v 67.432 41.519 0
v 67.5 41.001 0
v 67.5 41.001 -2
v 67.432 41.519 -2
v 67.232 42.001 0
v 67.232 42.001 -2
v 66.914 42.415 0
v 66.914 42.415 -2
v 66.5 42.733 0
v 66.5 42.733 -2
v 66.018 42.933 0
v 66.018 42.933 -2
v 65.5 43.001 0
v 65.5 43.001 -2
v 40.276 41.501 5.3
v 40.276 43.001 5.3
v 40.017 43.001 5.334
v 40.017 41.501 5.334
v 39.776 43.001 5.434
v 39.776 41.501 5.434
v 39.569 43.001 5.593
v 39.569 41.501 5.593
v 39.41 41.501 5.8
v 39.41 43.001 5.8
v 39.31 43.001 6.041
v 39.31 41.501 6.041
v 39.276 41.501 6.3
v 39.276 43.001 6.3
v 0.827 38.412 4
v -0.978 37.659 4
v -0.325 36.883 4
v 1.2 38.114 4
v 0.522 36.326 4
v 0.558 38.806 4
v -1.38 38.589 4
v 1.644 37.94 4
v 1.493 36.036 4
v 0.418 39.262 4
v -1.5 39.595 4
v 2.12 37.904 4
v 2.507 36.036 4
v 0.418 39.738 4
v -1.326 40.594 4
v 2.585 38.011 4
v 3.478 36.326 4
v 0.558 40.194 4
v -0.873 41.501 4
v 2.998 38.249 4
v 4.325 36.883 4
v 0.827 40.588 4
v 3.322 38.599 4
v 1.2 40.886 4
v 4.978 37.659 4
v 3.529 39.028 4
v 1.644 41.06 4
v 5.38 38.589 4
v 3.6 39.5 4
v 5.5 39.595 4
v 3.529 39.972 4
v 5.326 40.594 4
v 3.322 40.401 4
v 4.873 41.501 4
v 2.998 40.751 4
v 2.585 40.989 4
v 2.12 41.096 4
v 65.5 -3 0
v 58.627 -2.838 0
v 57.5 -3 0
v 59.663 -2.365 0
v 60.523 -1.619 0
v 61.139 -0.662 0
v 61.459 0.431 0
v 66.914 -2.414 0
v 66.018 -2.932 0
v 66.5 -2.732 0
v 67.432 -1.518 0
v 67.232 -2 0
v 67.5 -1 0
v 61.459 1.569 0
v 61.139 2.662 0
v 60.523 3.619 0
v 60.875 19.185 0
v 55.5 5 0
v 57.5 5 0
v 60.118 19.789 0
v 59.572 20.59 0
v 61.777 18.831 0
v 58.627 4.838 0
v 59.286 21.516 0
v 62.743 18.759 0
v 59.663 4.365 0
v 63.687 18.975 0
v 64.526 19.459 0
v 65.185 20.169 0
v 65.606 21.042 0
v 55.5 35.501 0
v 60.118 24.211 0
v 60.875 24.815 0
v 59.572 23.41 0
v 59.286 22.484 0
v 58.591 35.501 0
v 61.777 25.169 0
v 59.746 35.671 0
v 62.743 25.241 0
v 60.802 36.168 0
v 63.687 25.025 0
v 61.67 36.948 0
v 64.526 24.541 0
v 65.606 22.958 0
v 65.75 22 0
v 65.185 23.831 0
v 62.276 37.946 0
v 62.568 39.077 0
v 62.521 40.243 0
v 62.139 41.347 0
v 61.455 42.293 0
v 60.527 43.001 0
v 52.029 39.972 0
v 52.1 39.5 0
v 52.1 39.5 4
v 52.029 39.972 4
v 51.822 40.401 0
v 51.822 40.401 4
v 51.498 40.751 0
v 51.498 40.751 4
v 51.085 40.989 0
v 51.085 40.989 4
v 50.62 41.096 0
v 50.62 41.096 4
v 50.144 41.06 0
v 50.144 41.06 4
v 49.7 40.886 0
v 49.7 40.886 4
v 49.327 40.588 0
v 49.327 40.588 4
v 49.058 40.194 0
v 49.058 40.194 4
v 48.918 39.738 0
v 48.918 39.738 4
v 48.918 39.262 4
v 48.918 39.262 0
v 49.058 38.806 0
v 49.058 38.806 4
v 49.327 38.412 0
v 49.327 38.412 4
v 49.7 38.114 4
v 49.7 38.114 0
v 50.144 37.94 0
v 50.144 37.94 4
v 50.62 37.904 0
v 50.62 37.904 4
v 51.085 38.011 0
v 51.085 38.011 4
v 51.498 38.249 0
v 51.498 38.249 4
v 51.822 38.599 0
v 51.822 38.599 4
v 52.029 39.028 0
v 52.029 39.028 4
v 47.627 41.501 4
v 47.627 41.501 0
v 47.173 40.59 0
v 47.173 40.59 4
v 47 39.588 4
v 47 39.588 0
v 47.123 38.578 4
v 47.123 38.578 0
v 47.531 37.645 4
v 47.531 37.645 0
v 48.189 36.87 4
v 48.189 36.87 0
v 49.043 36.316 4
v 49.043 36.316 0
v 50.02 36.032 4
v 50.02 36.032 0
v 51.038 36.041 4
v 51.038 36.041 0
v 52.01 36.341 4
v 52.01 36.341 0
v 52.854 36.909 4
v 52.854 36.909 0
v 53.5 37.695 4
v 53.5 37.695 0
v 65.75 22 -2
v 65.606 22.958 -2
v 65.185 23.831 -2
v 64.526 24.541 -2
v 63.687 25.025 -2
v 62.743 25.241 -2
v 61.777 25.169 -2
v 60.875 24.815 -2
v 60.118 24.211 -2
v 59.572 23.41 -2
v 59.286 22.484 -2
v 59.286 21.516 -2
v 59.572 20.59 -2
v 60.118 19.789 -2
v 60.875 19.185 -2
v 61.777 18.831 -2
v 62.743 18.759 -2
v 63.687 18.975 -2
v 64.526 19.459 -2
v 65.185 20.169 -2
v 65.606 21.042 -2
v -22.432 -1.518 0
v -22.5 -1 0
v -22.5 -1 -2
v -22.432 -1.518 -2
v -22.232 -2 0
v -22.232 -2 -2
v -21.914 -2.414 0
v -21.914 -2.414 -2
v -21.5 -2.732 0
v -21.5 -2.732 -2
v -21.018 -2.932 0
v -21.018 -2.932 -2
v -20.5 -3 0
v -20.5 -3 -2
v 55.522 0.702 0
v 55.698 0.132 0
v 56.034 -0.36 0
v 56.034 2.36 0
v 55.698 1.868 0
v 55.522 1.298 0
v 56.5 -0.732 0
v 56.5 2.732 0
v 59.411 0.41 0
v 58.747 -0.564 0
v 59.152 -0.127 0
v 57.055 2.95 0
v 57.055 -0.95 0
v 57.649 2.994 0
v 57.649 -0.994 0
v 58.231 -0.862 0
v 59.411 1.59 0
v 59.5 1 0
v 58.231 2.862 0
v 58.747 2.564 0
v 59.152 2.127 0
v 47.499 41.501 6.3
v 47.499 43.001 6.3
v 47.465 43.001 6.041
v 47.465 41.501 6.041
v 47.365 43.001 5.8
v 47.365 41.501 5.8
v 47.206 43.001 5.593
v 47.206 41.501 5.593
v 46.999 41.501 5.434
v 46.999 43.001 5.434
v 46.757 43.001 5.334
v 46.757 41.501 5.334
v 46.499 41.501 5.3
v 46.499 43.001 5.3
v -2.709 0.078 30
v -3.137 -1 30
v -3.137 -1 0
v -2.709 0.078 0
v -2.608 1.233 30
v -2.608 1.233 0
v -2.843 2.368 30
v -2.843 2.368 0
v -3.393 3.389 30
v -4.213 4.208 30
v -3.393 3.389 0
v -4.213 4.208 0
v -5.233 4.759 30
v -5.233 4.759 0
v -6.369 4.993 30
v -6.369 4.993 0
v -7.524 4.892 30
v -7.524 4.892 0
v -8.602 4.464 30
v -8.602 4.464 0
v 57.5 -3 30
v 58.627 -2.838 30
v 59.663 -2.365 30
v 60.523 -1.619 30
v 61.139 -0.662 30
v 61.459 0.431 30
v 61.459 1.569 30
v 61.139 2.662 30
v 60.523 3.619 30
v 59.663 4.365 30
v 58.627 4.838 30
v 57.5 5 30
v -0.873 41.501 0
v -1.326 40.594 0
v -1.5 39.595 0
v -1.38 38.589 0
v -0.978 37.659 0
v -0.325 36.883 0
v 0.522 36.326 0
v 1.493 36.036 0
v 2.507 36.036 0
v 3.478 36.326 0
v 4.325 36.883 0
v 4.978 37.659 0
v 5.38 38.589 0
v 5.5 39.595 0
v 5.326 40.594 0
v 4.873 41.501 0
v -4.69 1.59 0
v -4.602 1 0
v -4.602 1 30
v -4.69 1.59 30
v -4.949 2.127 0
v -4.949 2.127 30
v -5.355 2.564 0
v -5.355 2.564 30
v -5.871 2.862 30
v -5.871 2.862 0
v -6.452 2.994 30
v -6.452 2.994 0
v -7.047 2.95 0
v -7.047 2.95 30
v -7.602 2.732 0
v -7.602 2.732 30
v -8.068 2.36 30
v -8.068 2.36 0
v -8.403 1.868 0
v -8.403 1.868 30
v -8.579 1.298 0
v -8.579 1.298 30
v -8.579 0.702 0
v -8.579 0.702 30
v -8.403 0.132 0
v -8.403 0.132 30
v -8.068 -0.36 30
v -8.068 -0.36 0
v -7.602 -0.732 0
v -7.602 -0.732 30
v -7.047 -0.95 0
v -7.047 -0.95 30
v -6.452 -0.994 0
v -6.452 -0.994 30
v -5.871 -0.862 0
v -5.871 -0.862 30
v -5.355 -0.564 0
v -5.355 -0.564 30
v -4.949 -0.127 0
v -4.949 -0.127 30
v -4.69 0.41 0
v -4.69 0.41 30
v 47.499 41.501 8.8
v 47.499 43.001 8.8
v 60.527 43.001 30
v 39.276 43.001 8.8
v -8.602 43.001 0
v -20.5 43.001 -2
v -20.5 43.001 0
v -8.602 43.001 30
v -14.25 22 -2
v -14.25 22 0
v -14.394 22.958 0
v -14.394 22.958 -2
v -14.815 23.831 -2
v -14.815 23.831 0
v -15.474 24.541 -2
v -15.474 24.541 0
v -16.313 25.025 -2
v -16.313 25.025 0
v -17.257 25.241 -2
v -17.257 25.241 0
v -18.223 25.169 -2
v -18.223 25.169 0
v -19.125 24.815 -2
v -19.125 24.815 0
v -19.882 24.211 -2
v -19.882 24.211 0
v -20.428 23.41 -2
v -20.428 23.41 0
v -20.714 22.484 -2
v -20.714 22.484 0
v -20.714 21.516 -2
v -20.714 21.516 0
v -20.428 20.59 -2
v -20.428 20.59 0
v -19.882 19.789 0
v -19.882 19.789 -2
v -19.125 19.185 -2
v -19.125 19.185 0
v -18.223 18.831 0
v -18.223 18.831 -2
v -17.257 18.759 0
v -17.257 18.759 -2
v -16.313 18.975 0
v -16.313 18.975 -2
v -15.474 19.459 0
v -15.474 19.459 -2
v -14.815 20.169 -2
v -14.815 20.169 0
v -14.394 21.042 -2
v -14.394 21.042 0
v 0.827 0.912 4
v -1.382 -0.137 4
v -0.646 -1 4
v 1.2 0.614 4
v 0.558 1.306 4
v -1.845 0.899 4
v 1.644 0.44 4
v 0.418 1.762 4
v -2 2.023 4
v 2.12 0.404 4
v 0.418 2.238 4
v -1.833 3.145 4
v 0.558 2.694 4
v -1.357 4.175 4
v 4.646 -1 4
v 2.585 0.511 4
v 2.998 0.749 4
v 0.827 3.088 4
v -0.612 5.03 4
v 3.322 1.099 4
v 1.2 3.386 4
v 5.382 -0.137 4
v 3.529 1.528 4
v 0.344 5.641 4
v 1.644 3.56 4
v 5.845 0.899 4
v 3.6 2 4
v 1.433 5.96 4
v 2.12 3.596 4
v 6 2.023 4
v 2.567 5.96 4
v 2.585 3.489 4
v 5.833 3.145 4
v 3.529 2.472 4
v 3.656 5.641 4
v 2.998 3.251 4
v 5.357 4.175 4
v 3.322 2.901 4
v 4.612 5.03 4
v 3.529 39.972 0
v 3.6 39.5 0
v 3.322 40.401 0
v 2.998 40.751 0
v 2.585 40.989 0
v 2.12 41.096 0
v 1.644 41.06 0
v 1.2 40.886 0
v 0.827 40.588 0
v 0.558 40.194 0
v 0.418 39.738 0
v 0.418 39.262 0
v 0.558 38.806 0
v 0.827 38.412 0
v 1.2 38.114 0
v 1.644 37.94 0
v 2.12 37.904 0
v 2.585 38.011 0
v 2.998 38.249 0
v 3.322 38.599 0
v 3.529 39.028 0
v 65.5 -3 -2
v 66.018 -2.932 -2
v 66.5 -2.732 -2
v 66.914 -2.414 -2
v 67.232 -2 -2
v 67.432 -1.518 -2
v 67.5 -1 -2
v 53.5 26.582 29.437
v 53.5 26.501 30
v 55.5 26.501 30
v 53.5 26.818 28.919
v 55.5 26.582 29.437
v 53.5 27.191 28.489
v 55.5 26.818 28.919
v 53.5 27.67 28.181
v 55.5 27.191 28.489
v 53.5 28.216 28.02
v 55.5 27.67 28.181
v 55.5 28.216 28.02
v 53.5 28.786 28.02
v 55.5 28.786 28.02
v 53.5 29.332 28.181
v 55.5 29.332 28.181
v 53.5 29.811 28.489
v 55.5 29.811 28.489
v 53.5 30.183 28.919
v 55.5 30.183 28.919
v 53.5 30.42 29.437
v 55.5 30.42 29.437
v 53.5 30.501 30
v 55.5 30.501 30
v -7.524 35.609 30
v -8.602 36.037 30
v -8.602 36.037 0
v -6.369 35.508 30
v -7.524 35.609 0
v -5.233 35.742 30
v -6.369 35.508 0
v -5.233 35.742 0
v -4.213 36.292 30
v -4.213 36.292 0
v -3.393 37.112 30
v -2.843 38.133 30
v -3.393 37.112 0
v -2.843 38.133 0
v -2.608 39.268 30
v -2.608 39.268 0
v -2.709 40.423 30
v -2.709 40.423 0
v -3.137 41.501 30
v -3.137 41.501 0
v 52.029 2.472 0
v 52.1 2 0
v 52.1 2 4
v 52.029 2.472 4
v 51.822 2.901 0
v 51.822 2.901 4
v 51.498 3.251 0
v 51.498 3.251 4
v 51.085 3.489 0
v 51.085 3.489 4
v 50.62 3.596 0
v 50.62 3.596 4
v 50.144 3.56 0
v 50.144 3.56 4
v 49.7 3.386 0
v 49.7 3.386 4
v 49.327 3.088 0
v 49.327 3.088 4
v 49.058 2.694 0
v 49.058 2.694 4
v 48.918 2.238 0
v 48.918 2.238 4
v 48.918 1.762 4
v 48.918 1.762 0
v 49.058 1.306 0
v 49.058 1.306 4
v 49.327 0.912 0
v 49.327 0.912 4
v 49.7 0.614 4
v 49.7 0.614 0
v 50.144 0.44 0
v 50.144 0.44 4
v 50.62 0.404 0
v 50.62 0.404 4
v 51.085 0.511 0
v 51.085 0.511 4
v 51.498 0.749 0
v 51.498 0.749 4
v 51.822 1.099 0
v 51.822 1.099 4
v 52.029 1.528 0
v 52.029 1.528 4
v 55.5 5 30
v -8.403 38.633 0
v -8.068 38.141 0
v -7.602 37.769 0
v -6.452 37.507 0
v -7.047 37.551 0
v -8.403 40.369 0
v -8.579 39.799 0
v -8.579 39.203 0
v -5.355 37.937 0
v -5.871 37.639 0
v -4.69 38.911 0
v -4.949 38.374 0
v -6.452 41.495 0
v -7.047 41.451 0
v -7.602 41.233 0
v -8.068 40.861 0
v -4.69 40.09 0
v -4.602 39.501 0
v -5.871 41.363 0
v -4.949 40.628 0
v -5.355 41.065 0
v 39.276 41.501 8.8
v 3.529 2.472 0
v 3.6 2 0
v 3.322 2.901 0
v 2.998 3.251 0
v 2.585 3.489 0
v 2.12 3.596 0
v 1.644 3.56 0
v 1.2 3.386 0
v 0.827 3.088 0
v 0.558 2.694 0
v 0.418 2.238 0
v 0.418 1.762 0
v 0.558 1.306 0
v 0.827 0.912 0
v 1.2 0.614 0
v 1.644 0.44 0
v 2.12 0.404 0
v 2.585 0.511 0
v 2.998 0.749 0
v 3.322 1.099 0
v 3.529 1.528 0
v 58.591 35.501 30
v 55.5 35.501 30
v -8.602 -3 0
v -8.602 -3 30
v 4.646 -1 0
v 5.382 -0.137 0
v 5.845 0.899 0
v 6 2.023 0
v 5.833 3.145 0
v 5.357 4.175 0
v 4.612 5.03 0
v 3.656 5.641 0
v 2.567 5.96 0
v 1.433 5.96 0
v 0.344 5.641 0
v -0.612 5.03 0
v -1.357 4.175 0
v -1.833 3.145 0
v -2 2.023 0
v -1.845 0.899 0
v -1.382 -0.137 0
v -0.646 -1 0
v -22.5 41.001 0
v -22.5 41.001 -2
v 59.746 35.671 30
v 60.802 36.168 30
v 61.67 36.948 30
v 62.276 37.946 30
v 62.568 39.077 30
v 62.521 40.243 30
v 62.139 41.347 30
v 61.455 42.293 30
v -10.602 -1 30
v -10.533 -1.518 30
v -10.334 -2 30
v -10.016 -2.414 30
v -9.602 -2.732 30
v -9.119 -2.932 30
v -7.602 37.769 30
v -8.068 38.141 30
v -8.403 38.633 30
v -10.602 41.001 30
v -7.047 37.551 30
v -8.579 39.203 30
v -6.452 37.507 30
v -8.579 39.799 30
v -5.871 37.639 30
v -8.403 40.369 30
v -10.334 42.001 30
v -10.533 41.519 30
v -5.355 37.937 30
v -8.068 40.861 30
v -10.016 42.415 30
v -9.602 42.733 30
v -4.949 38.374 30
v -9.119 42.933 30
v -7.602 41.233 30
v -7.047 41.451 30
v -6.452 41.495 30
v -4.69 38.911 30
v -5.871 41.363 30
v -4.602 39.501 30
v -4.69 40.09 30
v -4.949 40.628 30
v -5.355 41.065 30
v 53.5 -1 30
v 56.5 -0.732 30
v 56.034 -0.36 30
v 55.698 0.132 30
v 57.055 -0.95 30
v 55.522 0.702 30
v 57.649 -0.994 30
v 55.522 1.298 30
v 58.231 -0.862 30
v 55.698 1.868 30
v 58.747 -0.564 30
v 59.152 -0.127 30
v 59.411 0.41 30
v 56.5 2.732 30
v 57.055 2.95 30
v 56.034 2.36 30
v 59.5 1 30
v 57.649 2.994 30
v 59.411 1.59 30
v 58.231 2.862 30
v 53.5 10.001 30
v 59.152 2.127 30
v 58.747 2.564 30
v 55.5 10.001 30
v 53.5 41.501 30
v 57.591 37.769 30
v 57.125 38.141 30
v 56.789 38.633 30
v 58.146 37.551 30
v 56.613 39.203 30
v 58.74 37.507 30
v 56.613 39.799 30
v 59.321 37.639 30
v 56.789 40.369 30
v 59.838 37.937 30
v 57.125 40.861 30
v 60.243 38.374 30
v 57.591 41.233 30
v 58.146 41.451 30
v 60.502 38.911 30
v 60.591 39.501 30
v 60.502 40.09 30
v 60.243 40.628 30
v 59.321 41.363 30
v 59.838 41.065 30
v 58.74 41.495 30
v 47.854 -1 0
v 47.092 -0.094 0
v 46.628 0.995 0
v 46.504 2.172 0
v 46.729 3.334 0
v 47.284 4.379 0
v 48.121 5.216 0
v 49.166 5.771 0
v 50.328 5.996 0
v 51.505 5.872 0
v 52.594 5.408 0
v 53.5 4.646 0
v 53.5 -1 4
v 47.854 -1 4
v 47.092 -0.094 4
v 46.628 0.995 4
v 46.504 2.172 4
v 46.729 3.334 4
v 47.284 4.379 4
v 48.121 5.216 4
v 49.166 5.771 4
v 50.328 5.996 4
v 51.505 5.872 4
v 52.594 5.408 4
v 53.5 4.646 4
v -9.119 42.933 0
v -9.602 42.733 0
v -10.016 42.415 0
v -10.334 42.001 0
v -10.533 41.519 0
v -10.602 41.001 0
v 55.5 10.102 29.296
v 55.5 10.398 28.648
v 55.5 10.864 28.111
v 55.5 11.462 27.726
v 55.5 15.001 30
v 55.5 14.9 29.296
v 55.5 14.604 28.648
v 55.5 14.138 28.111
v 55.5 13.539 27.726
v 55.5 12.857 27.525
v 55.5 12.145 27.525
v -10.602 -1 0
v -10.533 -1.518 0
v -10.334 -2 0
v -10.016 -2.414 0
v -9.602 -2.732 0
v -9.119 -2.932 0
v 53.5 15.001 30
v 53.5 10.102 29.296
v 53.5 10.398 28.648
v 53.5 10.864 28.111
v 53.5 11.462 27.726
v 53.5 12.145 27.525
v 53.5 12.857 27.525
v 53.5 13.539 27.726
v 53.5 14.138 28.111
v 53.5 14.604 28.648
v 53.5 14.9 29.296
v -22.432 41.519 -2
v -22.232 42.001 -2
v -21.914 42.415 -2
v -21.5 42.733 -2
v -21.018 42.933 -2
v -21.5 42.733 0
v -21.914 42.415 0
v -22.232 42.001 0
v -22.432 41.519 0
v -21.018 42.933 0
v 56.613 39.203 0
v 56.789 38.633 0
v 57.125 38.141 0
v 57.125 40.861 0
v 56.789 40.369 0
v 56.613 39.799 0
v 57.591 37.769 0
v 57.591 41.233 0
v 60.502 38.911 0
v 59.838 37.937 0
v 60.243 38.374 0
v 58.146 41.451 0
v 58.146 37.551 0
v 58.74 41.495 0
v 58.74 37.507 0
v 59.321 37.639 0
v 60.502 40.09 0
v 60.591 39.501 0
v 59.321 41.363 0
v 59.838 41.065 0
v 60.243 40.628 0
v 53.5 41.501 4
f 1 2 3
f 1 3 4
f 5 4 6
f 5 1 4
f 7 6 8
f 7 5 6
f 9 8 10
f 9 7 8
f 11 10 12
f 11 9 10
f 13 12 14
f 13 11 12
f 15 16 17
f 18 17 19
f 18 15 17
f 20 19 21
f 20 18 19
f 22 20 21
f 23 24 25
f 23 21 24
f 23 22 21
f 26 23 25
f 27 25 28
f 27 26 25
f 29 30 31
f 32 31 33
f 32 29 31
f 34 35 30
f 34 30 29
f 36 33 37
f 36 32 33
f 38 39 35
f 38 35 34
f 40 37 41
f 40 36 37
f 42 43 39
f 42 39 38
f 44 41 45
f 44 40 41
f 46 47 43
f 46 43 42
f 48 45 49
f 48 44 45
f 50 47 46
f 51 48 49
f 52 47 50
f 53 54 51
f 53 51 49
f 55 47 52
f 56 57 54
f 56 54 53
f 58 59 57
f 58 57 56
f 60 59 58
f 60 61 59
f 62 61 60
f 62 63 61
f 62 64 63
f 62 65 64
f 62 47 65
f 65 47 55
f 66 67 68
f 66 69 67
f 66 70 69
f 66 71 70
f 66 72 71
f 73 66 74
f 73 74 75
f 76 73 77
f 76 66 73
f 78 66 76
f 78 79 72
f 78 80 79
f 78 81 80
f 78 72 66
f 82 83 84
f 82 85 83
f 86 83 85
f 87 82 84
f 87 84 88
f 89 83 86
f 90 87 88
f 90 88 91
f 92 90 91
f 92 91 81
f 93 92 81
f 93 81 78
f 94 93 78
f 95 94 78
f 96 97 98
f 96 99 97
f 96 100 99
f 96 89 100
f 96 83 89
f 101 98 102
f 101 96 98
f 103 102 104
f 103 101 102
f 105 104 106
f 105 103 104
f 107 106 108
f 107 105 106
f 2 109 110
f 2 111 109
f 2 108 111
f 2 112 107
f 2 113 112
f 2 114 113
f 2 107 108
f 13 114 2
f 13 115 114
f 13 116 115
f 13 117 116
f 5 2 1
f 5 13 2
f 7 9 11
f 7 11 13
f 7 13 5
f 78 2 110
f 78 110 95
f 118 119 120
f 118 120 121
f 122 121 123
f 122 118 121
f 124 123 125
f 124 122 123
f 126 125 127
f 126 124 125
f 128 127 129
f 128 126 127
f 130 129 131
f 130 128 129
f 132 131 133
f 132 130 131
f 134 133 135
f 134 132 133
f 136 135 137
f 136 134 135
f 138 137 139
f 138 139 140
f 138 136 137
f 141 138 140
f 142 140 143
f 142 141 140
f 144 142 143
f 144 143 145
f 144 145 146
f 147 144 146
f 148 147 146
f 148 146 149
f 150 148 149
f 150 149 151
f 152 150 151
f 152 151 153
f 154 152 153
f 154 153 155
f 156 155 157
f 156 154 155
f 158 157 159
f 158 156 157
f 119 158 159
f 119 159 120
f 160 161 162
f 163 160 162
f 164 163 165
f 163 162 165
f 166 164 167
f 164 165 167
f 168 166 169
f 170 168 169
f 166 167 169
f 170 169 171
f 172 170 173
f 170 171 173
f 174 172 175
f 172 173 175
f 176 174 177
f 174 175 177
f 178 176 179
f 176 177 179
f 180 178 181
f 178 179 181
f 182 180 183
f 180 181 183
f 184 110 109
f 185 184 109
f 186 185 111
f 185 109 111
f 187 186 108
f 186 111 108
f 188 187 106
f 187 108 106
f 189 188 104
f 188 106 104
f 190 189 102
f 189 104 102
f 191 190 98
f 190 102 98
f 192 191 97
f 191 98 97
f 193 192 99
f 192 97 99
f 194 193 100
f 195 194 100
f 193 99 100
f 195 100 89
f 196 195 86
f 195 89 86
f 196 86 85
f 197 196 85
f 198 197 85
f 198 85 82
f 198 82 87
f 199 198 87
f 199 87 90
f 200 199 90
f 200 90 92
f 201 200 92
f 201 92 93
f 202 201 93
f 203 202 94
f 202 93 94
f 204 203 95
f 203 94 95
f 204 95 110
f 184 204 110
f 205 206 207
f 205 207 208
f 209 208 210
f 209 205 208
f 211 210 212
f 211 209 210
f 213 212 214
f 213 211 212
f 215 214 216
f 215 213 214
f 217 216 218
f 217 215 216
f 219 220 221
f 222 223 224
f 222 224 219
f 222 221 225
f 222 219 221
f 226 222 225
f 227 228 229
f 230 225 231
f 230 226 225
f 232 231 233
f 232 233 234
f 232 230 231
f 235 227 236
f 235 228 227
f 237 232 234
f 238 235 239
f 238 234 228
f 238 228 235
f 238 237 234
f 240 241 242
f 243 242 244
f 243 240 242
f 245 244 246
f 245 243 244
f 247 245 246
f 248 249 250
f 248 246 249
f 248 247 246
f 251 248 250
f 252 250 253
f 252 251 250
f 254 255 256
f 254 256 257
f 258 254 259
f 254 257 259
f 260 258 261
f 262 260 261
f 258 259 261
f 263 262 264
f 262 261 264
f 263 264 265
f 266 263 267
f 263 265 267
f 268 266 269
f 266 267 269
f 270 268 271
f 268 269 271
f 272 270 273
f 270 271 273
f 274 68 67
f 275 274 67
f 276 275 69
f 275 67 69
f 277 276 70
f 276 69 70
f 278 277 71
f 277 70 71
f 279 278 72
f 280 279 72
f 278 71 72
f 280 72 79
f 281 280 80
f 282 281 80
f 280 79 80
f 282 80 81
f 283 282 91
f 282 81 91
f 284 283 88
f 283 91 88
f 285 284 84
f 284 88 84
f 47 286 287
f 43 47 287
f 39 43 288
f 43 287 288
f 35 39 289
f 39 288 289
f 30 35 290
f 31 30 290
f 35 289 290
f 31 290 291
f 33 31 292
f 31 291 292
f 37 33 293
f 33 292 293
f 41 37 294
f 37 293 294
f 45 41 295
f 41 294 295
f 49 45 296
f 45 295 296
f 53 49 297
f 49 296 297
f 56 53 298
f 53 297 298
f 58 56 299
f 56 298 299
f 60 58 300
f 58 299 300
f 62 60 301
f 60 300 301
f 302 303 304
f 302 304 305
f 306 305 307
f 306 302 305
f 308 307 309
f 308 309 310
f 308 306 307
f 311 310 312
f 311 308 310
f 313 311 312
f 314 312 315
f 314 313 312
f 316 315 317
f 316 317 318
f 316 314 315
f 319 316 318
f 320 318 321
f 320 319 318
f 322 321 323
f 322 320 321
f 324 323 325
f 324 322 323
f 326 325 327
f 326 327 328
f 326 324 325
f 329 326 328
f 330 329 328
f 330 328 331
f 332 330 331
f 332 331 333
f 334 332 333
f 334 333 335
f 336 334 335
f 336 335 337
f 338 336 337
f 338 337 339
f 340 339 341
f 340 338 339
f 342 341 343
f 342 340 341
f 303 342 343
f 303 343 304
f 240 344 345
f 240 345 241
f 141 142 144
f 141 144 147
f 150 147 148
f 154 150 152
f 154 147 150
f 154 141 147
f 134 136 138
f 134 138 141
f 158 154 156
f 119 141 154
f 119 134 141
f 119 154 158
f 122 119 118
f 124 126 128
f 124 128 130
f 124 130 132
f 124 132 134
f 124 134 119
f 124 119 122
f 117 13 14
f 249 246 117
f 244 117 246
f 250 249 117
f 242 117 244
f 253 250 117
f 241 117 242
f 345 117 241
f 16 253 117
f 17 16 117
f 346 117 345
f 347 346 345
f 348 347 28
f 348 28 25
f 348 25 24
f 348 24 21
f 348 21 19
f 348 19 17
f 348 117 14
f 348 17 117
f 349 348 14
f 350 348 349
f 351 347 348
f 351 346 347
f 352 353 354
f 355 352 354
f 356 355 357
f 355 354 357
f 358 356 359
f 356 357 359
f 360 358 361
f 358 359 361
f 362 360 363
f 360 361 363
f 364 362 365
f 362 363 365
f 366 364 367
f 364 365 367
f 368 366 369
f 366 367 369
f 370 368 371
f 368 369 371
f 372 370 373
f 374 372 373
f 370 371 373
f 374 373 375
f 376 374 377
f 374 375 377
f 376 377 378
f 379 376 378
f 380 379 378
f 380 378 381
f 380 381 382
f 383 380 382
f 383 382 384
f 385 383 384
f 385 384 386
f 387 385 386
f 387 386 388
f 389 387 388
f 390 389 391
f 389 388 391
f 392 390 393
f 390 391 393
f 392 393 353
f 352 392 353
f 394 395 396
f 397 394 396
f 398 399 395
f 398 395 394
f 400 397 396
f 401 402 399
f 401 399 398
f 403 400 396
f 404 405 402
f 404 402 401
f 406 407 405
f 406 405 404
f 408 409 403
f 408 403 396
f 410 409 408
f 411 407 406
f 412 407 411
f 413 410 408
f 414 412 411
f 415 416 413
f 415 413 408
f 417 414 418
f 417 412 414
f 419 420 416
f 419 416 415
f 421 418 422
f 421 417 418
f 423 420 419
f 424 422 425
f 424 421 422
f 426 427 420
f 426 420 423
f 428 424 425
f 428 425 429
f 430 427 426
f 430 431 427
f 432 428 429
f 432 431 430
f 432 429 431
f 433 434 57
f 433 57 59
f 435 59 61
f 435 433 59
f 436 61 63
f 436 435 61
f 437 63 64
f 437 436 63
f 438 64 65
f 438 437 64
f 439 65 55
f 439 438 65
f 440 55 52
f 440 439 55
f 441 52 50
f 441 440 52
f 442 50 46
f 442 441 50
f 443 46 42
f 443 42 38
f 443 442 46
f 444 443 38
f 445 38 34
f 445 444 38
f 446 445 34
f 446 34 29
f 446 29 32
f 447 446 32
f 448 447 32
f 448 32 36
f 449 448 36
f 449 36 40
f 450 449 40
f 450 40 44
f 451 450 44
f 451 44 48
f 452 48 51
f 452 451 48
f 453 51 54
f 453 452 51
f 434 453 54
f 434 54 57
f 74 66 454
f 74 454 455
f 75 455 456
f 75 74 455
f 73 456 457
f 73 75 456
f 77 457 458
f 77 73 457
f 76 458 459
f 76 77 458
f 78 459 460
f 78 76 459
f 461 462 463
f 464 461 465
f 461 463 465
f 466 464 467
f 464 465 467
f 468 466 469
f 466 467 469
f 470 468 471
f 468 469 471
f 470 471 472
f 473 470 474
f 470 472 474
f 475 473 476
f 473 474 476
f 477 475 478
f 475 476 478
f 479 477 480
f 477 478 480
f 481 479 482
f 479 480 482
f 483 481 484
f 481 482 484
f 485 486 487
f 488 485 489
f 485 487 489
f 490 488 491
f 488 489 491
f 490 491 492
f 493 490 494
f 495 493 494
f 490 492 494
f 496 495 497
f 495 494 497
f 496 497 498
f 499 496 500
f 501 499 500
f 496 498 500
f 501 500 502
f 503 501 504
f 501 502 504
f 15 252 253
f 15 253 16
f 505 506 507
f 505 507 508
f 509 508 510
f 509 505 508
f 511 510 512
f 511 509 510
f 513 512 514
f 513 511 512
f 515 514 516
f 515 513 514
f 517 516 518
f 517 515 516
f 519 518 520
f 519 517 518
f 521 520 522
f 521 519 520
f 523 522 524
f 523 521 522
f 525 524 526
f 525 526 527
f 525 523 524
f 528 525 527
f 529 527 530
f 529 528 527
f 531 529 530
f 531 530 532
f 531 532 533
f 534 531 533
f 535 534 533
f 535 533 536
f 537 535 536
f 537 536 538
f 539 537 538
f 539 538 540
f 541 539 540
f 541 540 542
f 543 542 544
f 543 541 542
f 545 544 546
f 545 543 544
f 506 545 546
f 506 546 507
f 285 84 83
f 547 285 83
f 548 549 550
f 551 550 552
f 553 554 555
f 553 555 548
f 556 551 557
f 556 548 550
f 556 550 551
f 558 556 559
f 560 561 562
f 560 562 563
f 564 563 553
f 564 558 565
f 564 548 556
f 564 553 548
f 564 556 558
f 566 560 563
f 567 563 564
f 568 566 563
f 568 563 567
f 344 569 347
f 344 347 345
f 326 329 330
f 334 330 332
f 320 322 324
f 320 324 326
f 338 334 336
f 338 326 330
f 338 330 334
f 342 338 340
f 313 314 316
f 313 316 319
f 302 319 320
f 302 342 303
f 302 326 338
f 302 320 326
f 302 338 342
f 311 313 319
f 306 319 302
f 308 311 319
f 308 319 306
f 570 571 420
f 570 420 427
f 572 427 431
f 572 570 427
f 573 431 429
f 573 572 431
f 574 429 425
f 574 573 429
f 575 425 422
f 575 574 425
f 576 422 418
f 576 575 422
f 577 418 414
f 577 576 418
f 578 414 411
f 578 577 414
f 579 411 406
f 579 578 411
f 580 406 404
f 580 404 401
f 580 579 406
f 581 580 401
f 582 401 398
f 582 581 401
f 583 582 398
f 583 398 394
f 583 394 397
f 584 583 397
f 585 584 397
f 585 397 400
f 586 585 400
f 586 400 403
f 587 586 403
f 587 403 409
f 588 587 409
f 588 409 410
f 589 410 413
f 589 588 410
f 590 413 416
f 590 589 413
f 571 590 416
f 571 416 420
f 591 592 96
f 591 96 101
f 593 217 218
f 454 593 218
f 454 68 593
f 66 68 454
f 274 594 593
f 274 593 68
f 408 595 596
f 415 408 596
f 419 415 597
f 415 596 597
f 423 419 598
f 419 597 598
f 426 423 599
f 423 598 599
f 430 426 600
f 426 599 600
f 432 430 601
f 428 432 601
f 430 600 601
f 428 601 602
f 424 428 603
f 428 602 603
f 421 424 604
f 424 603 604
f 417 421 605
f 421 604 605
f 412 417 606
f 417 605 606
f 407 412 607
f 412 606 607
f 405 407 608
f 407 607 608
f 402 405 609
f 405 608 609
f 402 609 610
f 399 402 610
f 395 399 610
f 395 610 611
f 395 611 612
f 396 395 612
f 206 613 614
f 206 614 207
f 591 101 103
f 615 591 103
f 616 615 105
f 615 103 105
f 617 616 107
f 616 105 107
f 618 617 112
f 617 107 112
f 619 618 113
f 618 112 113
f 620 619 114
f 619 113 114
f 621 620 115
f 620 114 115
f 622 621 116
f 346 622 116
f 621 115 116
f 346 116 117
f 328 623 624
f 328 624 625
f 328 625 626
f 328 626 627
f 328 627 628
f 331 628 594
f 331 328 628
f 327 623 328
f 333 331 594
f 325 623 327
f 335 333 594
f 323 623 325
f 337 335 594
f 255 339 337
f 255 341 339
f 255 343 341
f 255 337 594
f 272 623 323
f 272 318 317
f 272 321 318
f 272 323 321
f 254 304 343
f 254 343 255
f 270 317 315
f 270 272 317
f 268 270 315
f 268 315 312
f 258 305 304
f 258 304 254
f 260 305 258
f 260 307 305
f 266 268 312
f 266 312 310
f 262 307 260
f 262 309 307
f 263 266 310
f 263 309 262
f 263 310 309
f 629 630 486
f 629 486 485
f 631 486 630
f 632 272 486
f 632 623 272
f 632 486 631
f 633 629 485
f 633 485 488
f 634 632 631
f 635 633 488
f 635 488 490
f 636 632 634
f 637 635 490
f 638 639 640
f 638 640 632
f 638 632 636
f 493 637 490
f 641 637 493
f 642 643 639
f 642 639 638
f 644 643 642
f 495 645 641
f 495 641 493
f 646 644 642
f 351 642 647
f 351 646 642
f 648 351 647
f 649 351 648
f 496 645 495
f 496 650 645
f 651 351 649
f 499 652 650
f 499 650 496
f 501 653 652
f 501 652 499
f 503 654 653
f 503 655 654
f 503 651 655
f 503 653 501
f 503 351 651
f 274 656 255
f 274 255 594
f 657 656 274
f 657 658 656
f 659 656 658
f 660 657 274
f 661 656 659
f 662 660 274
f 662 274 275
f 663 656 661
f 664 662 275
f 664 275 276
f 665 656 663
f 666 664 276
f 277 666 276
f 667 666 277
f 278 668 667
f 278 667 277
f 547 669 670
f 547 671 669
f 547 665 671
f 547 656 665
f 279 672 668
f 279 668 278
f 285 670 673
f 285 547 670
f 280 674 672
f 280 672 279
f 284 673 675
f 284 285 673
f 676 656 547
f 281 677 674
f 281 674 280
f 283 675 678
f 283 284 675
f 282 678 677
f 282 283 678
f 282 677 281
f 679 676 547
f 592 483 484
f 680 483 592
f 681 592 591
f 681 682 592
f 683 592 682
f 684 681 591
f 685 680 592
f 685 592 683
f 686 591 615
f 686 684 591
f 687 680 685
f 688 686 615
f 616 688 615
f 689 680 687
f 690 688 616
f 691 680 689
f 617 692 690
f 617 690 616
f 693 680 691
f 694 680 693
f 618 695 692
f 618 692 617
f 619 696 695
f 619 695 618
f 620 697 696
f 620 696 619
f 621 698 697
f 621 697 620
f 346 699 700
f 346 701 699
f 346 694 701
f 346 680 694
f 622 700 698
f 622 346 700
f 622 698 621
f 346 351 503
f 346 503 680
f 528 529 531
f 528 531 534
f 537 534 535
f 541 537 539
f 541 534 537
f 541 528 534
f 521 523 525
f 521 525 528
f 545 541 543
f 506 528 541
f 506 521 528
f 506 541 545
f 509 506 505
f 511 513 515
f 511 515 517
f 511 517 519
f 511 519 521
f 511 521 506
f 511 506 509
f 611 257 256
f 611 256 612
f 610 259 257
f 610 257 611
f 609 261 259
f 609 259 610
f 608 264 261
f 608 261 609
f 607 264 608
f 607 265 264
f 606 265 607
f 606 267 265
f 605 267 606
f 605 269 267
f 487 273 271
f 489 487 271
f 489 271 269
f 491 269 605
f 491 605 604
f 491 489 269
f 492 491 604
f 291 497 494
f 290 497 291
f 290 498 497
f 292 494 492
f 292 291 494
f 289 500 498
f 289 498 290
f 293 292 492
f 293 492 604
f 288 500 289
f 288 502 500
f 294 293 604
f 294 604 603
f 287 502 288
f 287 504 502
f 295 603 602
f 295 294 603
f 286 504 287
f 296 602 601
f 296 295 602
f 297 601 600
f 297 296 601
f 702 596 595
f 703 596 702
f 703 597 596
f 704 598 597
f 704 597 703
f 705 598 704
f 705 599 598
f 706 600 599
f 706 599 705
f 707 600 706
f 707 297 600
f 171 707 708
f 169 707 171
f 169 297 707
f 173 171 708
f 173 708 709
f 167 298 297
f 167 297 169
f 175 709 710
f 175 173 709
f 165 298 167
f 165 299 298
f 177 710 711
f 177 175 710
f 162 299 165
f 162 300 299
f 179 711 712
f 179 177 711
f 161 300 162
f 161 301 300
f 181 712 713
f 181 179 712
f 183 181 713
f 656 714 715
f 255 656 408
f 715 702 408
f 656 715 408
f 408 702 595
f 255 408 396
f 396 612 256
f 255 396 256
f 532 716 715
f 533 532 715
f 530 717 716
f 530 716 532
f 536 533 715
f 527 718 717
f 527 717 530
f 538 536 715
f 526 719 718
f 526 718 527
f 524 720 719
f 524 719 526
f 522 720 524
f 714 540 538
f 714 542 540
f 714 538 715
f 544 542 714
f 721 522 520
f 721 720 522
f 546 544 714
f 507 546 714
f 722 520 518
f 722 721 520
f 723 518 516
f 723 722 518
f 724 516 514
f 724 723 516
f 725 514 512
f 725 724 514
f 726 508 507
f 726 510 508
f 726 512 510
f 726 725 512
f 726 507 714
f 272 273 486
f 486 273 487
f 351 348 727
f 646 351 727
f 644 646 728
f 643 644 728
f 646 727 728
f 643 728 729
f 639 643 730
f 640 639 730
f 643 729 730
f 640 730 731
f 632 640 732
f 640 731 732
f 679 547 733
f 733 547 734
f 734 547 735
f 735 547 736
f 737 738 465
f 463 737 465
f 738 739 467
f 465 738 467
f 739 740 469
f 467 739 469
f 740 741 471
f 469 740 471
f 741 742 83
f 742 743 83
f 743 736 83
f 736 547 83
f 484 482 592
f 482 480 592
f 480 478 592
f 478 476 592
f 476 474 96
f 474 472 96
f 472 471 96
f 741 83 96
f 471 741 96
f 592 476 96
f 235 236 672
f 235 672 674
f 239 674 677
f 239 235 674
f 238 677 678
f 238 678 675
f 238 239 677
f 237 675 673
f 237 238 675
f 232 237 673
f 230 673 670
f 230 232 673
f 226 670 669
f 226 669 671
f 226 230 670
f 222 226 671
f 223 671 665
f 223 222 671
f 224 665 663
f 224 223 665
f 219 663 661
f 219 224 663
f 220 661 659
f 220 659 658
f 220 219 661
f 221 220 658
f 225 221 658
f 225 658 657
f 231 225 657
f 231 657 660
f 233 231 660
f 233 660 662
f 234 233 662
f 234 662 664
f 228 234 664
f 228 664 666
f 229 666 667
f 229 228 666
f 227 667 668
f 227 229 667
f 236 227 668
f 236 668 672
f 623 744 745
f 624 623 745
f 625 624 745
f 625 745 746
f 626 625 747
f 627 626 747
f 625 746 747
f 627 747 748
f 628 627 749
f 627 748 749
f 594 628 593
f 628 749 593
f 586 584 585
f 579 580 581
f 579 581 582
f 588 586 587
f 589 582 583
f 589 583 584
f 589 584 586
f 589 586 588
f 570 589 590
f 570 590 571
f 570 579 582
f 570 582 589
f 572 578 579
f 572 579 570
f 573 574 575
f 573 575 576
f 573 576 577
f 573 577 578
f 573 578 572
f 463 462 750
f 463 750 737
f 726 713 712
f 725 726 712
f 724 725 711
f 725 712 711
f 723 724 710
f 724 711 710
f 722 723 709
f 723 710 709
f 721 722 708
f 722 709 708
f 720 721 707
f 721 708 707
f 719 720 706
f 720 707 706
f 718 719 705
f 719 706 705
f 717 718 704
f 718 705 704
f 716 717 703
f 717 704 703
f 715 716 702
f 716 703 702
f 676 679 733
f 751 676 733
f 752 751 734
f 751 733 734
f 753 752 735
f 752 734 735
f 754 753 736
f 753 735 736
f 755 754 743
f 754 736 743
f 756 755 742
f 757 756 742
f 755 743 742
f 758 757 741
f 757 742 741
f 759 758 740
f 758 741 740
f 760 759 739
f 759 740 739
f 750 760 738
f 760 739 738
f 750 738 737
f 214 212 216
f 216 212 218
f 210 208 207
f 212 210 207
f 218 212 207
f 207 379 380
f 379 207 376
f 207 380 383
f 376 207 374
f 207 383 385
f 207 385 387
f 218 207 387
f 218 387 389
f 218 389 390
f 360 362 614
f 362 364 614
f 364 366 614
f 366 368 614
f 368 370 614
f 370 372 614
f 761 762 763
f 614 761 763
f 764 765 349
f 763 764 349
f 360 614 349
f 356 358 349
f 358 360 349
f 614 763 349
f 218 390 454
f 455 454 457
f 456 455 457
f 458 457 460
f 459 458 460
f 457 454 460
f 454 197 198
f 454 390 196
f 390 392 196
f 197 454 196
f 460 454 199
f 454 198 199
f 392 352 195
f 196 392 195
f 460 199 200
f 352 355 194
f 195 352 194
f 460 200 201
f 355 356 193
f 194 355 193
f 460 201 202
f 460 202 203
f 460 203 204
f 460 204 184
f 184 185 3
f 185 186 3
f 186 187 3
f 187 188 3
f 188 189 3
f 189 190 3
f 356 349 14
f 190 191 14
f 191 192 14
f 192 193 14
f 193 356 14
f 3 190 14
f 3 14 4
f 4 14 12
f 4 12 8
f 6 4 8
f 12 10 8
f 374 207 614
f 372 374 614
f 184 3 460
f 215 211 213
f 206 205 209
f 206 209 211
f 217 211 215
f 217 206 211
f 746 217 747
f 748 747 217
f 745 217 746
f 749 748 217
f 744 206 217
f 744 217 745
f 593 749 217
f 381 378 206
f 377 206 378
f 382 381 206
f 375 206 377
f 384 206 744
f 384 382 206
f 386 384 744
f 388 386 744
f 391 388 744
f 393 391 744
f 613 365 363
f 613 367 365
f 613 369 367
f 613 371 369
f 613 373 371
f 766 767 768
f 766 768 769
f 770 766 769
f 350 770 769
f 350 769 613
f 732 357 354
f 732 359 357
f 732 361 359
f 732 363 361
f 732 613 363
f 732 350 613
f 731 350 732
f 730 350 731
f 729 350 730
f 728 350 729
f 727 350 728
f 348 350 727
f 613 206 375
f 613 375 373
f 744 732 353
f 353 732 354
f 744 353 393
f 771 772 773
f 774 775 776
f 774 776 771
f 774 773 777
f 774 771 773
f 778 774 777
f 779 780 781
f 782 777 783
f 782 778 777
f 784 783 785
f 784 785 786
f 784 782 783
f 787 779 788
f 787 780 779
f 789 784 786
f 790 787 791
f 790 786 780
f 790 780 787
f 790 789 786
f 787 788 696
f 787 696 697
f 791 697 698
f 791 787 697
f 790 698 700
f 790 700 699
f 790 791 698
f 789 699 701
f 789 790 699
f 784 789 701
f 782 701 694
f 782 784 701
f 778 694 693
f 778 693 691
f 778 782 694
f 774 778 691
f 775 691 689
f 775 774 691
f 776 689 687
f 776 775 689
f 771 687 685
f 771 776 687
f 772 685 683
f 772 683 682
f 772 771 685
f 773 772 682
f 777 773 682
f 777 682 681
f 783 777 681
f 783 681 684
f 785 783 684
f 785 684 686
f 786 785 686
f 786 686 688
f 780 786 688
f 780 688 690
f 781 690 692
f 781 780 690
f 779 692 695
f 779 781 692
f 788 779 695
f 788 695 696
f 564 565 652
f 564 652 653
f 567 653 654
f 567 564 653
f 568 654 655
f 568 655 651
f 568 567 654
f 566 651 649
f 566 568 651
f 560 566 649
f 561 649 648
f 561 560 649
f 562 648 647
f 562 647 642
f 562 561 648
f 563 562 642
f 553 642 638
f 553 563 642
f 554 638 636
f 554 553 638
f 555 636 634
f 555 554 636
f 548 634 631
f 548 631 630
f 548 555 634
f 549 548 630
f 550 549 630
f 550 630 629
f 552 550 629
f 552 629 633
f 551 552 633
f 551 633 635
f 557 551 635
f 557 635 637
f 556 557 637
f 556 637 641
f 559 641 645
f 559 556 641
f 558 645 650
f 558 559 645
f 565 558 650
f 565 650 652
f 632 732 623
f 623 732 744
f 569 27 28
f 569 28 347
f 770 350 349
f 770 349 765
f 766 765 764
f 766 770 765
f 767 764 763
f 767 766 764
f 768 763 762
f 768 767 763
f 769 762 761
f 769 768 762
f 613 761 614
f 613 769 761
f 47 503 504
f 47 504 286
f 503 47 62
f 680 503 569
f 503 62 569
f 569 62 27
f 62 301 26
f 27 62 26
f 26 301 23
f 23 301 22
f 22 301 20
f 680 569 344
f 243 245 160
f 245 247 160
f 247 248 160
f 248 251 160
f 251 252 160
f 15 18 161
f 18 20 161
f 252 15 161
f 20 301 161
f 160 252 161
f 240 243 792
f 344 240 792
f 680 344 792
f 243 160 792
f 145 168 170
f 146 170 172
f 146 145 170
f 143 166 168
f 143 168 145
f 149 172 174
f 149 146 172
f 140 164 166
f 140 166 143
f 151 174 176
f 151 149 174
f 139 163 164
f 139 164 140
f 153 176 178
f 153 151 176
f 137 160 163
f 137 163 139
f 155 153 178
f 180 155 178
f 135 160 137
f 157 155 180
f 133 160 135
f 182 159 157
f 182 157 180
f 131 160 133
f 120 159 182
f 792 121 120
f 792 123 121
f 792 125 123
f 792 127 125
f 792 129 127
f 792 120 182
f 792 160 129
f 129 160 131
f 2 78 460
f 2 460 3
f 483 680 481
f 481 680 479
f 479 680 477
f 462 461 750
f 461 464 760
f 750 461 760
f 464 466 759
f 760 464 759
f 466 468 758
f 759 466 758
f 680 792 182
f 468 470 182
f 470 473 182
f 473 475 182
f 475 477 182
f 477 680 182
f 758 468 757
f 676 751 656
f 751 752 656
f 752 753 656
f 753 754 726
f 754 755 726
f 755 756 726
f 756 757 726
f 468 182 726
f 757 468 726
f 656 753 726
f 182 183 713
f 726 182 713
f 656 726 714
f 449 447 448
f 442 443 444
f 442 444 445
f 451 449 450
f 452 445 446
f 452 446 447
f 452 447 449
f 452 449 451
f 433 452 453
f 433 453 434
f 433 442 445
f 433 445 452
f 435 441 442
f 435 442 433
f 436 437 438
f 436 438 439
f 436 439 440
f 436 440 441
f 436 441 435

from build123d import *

# Parameters (mm, degrees)
SKETCH_2_R          = 3.25
EXTRUDE_1_DEPTH     = 2
SKETCH_2_3_R        = 2
EXTRUDE_2_DEPTH     = 30
SKETCH_2_4_R        = 1.6
EXTRUDE_3_DEPTH     = 4
CUT_EXTRUDE_1_REACH = 95.984
SKETCH_3_R          = 2.5
SKETCH_3_R_2        = 2
CUT_EXTRUDE_2_REACH = 88.236


with BuildPart() as part:
    # 草图2 → 凸台-拉伸1 (new body)
    with BuildSketch(Plane.XY):
        with BuildLine():
            ThreePointArc((-20.5, 43.00095784), (-21.914213562, 42.415171403), (-22.5, 41.00095784))
            Line((-22.5, 41.00095784), (-22.5, -1))
            ThreePointArc((-22.5, -1), (-21.914213562, -2.414213562), (-20.5, -3))
            Line((-20.5, -3), (65.5, -3))
            ThreePointArc((65.5, -3), (66.914213562, -2.414213562), (67.5, -1))
            Line((67.5, -1), (67.5, 41.00095784))
            ThreePointArc((67.5, 41.00095784), (66.914213562, 42.415171403), (65.5, 43.00095784))
            Line((65.5, 43.00095784), (-20.5, 43.00095784))
        make_face()
        with Locations((-17.5, 22)):
            Circle(SKETCH_2_R, mode=Mode.SUBTRACT)
        with Locations((62.5, 22)):
            Circle(SKETCH_2_R, mode=Mode.SUBTRACT)
    extrude(amount=-EXTRUDE_1_DEPTH)

    # 草图2<3> → 凸台-拉伸2 (add)
    with BuildSketch(Plane.XY):
        with BuildLine():
            ThreePointArc((-10.601500464, -1), (-10.015714027, -2.414213562), (-8.601500464, -3))
            Line((-8.601500464, -3), (57.5, -3))
            ThreePointArc((57.5, -3), (61.5, 1), (57.5, 5))
            Line((57.5, 5), (55.5, 5))
            Line((55.5, 5), (55.5, 35.50095784))
            Line((55.5, 35.50095784), (58.590729836, 35.50095784))
            ThreePointArc((58.590729836, 35.50095784), (62.463713182, 38.50095784), (60.527221509, 43.00095784))
            Line((60.527221509, 43.00095784), (-8.601500464, 43.00095784))
            ThreePointArc((-8.601500464, 43.00095784), (-10.015714027, 42.415171403), (-10.601500464, 41.00095784))
            Line((-10.601500464, 41.00095784), (-10.601500464, -1))
        make_face()
        with Locations((-6.601500464, 1)):
            Circle(SKETCH_2_3_R, mode=Mode.SUBTRACT)
        with BuildLine():
            ThreePointArc((-3.137398849, -1), (-3.77307334, 3.828427125), (-8.601500464, 4.464101615))
            Line((-8.601500464, 4.464101615), (-8.601500464, 36.036856225))
            ThreePointArc((-8.601500464, 36.036856225), (-3.77307334, 36.672530716), (-3.137398849, 41.50095784))
            Line((-3.137398849, 41.50095784), (53.5, 41.50095784))
            Line((53.5, 41.50095784), (53.5, -1))
            Line((53.5, -1), (-3.137398849, -1))
        make_face(mode=Mode.SUBTRACT)
        with Locations((-6.601500464, 39.50095784)):
            Circle(SKETCH_2_3_R, mode=Mode.SUBTRACT)
        with Locations((58.590729836, 39.50095784)):
            Circle(SKETCH_2_3_R, mode=Mode.SUBTRACT)
        with Locations((57.5, 1)):
            Circle(SKETCH_2_3_R, mode=Mode.SUBTRACT)
    extrude(amount=EXTRUDE_2_DEPTH)

    # 草图2<4> → 凸台-拉伸3 (add)
    # profile 1 of 4: a face of its own
    with BuildSketch(Plane.XY):
        with BuildLine():
            ThreePointArc((4.645751311, -1), (2, 6), (-0.645751311, -1))
            Line((-0.645751311, -1), (4.645751311, -1))
        make_face()
        with Locations((2, 2)):
            Circle(SKETCH_2_4_R, mode=Mode.SUBTRACT)
    # profile 2 of 4: a face of its own
    with BuildSketch(Plane.XY):
        with BuildLine():
            ThreePointArc((53.5, 4.645751311), (47.671572875, 4.828427125), (47.854248689, -1))
            Line((47.854248689, -1), (53.5, -1))
            Line((53.5, -1), (53.5, 4.645751311))
        make_face()
        with Locations((50.5, 2)):
            Circle(SKETCH_2_4_R, mode=Mode.SUBTRACT)
    # profile 3 of 4: a face of its own
    with BuildSketch(Plane.XY):
        with BuildLine():
            Line((4.872781496, 41.50095784), (-0.872781496, 41.50095784))
            ThreePointArc((-0.872781496, 41.50095784), (2, 35.99904216), (4.872781496, 41.50095784))
        make_face()
        with Locations((2, 39.5)):
            Circle(SKETCH_2_4_R, mode=Mode.SUBTRACT)
    # profile 4 of 4: a face of its own
    with BuildSketch(Plane.XY):
        with BuildLine():
            ThreePointArc((47.627218504, 41.50095784), (48.596140902, 36.56196897), (53.5, 37.695365466))
            Line((53.5, 37.695365466), (53.5, 41.50095784))
            Line((53.5, 41.50095784), (47.627218504, 41.50095784))
        make_face()
        with Locations((50.5, 39.5)):
            Circle(SKETCH_2_4_R, mode=Mode.SUBTRACT)
    extrude(amount=EXTRUDE_3_DEPTH)

    # 草图3 → 切除-拉伸1 (cut, up to next)
    with BuildSketch(Plane(origin=(55.5, 0, 0), x_dir=(0, 0, -1), z_dir=(1, 0, 0)), mode=Mode.PRIVATE) as cut_extrude_1_sk1:
        with Locations((-30, 12.50095784)):
            Circle(SKETCH_3_R)
    cut_extrude_1_tool1 = extrude(cut_extrude_1_sk1.sketch, amount=-CUT_EXTRUDE_1_REACH, mode=Mode.PRIVATE) & part.part
    # 草图3 → 切除-拉伸1 (cut, up to next)
    with BuildSketch(Plane(origin=(55.5, 0, 0), x_dir=(0, 0, -1), z_dir=(1, 0, 0)), mode=Mode.PRIVATE) as cut_extrude_1_sk2:
        with Locations((-30, 28.50095784)):
            Circle(SKETCH_3_R_2)
    cut_extrude_1_tool2 = extrude(cut_extrude_1_sk2.sketch, amount=-CUT_EXTRUDE_1_REACH, mode=Mode.PRIVATE) & part.part
    add(cut_extrude_1_tool1.solids().sort_by_distance((55.5, 12.500958, 30))[0], mode=Mode.SUBTRACT)
    add(cut_extrude_1_tool2.solids().sort_by_distance((55.5, 28.500958, 30))[0], mode=Mode.SUBTRACT)

    # 草图5 → 切除-拉伸2 (cut, up to next)
    with BuildSketch(Plane.XZ.offset(-41.50095784), mode=Mode.PRIVATE) as cut_extrude_2_sk1:
        with BuildLine():
            Line((39.27567, 8.8), (47.49867, 8.8))
            Line((47.49867, 8.8), (47.49867, 6.3))
            ThreePointArc((47.49867, 6.3), (47.205776781, 5.592893219), (46.49867, 5.3))
            Line((46.49867, 5.3), (40.27567, 5.3))
            ThreePointArc((40.27567, 5.3), (39.568563219, 5.592893219), (39.27567, 6.3))
            Line((39.27567, 6.3), (39.27567, 8.8))
        make_face()
    cut_extrude_2_tool1 = extrude(cut_extrude_2_sk1.sketch, amount=-CUT_EXTRUDE_2_REACH, mode=Mode.PRIVATE) & part.part
    add(cut_extrude_2_tool1.solids().sort_by_distance((43.38717, 41.500958, 7.073111))[0], mode=Mode.SUBTRACT)


solid = part.part
